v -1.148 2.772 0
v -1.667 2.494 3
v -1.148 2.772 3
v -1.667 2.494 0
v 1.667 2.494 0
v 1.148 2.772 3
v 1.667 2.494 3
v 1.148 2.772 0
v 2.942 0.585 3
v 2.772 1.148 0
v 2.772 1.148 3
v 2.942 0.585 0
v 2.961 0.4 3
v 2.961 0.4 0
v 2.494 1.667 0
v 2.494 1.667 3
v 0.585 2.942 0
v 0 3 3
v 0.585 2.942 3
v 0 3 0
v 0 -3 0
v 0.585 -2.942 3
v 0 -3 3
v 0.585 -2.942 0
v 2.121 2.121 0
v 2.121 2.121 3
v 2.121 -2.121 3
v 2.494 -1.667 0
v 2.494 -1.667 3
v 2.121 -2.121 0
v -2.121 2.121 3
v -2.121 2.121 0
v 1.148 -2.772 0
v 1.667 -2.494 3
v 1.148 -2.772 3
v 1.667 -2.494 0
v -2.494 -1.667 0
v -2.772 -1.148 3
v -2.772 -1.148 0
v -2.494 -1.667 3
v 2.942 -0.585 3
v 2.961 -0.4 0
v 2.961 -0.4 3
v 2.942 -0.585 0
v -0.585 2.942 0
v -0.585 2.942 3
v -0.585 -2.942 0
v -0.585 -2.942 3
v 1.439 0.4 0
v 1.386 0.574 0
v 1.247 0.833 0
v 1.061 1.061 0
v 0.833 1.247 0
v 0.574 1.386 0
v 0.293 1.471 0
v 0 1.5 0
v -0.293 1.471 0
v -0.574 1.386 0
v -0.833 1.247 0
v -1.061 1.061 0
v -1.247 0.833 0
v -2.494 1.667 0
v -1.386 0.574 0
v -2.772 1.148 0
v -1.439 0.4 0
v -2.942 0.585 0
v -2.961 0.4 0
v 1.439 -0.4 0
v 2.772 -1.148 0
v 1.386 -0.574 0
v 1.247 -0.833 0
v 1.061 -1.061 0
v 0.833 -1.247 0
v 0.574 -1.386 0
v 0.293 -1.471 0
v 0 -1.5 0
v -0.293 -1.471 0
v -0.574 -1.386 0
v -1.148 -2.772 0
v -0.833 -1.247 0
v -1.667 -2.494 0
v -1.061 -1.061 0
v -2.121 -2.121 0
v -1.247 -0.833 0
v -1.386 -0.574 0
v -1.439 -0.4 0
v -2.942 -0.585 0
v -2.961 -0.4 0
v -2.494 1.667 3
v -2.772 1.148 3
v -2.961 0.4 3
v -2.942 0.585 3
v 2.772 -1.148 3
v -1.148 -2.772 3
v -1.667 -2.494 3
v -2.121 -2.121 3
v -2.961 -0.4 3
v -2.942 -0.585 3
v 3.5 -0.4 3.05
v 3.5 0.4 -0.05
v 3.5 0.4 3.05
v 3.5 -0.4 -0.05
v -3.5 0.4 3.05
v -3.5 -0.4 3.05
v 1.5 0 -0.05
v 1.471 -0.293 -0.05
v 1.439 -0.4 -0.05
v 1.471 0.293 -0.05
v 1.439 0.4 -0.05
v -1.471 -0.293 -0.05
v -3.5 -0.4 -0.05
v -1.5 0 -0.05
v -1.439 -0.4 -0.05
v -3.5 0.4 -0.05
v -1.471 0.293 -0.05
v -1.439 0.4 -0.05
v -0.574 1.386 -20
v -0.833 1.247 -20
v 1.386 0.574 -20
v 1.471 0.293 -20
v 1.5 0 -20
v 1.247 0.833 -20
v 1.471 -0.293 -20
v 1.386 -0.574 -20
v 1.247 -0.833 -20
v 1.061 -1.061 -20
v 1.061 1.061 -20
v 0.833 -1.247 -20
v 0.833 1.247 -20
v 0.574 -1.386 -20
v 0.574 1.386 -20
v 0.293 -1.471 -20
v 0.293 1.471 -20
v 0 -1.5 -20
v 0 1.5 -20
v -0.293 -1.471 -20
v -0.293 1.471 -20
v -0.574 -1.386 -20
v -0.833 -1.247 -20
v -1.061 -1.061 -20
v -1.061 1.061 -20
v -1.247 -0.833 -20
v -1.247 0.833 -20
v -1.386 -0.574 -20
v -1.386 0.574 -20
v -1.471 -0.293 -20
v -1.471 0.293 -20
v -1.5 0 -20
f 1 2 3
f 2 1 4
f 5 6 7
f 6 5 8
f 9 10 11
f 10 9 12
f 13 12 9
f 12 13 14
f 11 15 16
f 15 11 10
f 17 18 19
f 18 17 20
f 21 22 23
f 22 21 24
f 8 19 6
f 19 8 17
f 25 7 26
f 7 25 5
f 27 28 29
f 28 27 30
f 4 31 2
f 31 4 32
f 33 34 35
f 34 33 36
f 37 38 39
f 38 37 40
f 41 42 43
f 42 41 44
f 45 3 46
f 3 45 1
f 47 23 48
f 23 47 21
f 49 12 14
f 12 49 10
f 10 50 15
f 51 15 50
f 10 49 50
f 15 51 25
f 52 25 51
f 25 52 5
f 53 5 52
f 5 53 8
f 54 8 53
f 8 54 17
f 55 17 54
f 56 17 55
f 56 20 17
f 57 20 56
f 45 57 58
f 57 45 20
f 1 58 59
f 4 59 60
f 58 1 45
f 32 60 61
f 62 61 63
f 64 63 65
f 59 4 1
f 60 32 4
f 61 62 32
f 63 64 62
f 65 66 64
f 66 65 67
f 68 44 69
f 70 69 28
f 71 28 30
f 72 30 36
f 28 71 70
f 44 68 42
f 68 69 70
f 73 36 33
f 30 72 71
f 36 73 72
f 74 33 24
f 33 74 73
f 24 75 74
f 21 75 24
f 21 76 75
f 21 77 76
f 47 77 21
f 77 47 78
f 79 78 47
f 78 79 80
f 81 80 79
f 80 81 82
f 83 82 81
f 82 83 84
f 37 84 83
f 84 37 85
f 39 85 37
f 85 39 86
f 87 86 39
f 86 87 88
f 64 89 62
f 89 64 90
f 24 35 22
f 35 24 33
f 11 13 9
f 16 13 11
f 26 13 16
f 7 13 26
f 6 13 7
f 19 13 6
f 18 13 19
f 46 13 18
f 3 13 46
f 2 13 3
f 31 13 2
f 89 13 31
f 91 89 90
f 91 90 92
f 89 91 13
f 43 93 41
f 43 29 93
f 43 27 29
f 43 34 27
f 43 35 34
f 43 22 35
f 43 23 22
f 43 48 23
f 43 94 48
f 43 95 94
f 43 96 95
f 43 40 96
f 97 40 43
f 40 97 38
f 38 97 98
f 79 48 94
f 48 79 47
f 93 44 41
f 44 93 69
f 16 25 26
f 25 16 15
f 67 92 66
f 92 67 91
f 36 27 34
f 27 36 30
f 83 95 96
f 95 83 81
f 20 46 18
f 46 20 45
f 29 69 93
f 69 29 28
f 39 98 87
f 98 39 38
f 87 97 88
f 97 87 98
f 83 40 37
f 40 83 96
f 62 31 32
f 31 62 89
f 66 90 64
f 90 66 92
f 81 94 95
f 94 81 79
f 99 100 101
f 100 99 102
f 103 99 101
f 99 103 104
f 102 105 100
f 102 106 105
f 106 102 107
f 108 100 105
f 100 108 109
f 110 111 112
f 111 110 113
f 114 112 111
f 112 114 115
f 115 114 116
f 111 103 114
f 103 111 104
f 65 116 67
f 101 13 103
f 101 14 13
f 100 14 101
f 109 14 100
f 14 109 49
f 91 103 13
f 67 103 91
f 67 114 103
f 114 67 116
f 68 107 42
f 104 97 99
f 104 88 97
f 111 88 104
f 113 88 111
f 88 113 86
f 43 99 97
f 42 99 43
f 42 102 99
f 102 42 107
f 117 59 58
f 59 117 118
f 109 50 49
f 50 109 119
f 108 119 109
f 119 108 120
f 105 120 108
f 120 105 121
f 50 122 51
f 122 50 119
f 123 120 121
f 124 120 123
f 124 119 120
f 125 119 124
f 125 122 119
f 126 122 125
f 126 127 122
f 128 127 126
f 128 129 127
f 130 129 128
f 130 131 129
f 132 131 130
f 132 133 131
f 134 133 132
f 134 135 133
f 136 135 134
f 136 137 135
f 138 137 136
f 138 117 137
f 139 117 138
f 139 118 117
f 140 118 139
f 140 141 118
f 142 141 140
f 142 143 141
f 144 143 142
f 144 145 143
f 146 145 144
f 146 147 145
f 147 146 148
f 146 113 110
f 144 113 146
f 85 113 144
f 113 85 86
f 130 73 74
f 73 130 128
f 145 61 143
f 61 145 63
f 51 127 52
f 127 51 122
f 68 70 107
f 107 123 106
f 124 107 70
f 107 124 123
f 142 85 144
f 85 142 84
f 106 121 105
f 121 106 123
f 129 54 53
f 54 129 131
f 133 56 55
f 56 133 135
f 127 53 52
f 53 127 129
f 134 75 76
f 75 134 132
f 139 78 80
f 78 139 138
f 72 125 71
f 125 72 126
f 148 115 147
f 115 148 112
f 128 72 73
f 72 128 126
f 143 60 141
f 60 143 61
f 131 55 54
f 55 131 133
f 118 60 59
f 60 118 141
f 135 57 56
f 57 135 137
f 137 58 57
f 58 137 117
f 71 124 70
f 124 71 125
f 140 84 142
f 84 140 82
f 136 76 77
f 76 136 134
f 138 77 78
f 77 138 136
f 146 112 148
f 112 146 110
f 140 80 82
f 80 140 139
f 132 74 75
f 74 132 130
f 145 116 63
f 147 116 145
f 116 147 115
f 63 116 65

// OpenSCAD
// Fastener: Screw
// A simple metric screw model

module screw(diameter=3, length=20, head_diameter=6, head_height=3) {
    union() {
        // Head
        cylinder(d=head_diameter, h=head_height, $fn=32);
        // Slot on head
        translate([0, 0, head_height/2])
            cube([head_diameter+1, 0.8, head_height+0.1], center=true);
        // Shaft
        translate([0, 0, -length])
            cylinder(d=diameter, h=length, $fn=32);
    }
}

screw(diameter=3, length=20);
